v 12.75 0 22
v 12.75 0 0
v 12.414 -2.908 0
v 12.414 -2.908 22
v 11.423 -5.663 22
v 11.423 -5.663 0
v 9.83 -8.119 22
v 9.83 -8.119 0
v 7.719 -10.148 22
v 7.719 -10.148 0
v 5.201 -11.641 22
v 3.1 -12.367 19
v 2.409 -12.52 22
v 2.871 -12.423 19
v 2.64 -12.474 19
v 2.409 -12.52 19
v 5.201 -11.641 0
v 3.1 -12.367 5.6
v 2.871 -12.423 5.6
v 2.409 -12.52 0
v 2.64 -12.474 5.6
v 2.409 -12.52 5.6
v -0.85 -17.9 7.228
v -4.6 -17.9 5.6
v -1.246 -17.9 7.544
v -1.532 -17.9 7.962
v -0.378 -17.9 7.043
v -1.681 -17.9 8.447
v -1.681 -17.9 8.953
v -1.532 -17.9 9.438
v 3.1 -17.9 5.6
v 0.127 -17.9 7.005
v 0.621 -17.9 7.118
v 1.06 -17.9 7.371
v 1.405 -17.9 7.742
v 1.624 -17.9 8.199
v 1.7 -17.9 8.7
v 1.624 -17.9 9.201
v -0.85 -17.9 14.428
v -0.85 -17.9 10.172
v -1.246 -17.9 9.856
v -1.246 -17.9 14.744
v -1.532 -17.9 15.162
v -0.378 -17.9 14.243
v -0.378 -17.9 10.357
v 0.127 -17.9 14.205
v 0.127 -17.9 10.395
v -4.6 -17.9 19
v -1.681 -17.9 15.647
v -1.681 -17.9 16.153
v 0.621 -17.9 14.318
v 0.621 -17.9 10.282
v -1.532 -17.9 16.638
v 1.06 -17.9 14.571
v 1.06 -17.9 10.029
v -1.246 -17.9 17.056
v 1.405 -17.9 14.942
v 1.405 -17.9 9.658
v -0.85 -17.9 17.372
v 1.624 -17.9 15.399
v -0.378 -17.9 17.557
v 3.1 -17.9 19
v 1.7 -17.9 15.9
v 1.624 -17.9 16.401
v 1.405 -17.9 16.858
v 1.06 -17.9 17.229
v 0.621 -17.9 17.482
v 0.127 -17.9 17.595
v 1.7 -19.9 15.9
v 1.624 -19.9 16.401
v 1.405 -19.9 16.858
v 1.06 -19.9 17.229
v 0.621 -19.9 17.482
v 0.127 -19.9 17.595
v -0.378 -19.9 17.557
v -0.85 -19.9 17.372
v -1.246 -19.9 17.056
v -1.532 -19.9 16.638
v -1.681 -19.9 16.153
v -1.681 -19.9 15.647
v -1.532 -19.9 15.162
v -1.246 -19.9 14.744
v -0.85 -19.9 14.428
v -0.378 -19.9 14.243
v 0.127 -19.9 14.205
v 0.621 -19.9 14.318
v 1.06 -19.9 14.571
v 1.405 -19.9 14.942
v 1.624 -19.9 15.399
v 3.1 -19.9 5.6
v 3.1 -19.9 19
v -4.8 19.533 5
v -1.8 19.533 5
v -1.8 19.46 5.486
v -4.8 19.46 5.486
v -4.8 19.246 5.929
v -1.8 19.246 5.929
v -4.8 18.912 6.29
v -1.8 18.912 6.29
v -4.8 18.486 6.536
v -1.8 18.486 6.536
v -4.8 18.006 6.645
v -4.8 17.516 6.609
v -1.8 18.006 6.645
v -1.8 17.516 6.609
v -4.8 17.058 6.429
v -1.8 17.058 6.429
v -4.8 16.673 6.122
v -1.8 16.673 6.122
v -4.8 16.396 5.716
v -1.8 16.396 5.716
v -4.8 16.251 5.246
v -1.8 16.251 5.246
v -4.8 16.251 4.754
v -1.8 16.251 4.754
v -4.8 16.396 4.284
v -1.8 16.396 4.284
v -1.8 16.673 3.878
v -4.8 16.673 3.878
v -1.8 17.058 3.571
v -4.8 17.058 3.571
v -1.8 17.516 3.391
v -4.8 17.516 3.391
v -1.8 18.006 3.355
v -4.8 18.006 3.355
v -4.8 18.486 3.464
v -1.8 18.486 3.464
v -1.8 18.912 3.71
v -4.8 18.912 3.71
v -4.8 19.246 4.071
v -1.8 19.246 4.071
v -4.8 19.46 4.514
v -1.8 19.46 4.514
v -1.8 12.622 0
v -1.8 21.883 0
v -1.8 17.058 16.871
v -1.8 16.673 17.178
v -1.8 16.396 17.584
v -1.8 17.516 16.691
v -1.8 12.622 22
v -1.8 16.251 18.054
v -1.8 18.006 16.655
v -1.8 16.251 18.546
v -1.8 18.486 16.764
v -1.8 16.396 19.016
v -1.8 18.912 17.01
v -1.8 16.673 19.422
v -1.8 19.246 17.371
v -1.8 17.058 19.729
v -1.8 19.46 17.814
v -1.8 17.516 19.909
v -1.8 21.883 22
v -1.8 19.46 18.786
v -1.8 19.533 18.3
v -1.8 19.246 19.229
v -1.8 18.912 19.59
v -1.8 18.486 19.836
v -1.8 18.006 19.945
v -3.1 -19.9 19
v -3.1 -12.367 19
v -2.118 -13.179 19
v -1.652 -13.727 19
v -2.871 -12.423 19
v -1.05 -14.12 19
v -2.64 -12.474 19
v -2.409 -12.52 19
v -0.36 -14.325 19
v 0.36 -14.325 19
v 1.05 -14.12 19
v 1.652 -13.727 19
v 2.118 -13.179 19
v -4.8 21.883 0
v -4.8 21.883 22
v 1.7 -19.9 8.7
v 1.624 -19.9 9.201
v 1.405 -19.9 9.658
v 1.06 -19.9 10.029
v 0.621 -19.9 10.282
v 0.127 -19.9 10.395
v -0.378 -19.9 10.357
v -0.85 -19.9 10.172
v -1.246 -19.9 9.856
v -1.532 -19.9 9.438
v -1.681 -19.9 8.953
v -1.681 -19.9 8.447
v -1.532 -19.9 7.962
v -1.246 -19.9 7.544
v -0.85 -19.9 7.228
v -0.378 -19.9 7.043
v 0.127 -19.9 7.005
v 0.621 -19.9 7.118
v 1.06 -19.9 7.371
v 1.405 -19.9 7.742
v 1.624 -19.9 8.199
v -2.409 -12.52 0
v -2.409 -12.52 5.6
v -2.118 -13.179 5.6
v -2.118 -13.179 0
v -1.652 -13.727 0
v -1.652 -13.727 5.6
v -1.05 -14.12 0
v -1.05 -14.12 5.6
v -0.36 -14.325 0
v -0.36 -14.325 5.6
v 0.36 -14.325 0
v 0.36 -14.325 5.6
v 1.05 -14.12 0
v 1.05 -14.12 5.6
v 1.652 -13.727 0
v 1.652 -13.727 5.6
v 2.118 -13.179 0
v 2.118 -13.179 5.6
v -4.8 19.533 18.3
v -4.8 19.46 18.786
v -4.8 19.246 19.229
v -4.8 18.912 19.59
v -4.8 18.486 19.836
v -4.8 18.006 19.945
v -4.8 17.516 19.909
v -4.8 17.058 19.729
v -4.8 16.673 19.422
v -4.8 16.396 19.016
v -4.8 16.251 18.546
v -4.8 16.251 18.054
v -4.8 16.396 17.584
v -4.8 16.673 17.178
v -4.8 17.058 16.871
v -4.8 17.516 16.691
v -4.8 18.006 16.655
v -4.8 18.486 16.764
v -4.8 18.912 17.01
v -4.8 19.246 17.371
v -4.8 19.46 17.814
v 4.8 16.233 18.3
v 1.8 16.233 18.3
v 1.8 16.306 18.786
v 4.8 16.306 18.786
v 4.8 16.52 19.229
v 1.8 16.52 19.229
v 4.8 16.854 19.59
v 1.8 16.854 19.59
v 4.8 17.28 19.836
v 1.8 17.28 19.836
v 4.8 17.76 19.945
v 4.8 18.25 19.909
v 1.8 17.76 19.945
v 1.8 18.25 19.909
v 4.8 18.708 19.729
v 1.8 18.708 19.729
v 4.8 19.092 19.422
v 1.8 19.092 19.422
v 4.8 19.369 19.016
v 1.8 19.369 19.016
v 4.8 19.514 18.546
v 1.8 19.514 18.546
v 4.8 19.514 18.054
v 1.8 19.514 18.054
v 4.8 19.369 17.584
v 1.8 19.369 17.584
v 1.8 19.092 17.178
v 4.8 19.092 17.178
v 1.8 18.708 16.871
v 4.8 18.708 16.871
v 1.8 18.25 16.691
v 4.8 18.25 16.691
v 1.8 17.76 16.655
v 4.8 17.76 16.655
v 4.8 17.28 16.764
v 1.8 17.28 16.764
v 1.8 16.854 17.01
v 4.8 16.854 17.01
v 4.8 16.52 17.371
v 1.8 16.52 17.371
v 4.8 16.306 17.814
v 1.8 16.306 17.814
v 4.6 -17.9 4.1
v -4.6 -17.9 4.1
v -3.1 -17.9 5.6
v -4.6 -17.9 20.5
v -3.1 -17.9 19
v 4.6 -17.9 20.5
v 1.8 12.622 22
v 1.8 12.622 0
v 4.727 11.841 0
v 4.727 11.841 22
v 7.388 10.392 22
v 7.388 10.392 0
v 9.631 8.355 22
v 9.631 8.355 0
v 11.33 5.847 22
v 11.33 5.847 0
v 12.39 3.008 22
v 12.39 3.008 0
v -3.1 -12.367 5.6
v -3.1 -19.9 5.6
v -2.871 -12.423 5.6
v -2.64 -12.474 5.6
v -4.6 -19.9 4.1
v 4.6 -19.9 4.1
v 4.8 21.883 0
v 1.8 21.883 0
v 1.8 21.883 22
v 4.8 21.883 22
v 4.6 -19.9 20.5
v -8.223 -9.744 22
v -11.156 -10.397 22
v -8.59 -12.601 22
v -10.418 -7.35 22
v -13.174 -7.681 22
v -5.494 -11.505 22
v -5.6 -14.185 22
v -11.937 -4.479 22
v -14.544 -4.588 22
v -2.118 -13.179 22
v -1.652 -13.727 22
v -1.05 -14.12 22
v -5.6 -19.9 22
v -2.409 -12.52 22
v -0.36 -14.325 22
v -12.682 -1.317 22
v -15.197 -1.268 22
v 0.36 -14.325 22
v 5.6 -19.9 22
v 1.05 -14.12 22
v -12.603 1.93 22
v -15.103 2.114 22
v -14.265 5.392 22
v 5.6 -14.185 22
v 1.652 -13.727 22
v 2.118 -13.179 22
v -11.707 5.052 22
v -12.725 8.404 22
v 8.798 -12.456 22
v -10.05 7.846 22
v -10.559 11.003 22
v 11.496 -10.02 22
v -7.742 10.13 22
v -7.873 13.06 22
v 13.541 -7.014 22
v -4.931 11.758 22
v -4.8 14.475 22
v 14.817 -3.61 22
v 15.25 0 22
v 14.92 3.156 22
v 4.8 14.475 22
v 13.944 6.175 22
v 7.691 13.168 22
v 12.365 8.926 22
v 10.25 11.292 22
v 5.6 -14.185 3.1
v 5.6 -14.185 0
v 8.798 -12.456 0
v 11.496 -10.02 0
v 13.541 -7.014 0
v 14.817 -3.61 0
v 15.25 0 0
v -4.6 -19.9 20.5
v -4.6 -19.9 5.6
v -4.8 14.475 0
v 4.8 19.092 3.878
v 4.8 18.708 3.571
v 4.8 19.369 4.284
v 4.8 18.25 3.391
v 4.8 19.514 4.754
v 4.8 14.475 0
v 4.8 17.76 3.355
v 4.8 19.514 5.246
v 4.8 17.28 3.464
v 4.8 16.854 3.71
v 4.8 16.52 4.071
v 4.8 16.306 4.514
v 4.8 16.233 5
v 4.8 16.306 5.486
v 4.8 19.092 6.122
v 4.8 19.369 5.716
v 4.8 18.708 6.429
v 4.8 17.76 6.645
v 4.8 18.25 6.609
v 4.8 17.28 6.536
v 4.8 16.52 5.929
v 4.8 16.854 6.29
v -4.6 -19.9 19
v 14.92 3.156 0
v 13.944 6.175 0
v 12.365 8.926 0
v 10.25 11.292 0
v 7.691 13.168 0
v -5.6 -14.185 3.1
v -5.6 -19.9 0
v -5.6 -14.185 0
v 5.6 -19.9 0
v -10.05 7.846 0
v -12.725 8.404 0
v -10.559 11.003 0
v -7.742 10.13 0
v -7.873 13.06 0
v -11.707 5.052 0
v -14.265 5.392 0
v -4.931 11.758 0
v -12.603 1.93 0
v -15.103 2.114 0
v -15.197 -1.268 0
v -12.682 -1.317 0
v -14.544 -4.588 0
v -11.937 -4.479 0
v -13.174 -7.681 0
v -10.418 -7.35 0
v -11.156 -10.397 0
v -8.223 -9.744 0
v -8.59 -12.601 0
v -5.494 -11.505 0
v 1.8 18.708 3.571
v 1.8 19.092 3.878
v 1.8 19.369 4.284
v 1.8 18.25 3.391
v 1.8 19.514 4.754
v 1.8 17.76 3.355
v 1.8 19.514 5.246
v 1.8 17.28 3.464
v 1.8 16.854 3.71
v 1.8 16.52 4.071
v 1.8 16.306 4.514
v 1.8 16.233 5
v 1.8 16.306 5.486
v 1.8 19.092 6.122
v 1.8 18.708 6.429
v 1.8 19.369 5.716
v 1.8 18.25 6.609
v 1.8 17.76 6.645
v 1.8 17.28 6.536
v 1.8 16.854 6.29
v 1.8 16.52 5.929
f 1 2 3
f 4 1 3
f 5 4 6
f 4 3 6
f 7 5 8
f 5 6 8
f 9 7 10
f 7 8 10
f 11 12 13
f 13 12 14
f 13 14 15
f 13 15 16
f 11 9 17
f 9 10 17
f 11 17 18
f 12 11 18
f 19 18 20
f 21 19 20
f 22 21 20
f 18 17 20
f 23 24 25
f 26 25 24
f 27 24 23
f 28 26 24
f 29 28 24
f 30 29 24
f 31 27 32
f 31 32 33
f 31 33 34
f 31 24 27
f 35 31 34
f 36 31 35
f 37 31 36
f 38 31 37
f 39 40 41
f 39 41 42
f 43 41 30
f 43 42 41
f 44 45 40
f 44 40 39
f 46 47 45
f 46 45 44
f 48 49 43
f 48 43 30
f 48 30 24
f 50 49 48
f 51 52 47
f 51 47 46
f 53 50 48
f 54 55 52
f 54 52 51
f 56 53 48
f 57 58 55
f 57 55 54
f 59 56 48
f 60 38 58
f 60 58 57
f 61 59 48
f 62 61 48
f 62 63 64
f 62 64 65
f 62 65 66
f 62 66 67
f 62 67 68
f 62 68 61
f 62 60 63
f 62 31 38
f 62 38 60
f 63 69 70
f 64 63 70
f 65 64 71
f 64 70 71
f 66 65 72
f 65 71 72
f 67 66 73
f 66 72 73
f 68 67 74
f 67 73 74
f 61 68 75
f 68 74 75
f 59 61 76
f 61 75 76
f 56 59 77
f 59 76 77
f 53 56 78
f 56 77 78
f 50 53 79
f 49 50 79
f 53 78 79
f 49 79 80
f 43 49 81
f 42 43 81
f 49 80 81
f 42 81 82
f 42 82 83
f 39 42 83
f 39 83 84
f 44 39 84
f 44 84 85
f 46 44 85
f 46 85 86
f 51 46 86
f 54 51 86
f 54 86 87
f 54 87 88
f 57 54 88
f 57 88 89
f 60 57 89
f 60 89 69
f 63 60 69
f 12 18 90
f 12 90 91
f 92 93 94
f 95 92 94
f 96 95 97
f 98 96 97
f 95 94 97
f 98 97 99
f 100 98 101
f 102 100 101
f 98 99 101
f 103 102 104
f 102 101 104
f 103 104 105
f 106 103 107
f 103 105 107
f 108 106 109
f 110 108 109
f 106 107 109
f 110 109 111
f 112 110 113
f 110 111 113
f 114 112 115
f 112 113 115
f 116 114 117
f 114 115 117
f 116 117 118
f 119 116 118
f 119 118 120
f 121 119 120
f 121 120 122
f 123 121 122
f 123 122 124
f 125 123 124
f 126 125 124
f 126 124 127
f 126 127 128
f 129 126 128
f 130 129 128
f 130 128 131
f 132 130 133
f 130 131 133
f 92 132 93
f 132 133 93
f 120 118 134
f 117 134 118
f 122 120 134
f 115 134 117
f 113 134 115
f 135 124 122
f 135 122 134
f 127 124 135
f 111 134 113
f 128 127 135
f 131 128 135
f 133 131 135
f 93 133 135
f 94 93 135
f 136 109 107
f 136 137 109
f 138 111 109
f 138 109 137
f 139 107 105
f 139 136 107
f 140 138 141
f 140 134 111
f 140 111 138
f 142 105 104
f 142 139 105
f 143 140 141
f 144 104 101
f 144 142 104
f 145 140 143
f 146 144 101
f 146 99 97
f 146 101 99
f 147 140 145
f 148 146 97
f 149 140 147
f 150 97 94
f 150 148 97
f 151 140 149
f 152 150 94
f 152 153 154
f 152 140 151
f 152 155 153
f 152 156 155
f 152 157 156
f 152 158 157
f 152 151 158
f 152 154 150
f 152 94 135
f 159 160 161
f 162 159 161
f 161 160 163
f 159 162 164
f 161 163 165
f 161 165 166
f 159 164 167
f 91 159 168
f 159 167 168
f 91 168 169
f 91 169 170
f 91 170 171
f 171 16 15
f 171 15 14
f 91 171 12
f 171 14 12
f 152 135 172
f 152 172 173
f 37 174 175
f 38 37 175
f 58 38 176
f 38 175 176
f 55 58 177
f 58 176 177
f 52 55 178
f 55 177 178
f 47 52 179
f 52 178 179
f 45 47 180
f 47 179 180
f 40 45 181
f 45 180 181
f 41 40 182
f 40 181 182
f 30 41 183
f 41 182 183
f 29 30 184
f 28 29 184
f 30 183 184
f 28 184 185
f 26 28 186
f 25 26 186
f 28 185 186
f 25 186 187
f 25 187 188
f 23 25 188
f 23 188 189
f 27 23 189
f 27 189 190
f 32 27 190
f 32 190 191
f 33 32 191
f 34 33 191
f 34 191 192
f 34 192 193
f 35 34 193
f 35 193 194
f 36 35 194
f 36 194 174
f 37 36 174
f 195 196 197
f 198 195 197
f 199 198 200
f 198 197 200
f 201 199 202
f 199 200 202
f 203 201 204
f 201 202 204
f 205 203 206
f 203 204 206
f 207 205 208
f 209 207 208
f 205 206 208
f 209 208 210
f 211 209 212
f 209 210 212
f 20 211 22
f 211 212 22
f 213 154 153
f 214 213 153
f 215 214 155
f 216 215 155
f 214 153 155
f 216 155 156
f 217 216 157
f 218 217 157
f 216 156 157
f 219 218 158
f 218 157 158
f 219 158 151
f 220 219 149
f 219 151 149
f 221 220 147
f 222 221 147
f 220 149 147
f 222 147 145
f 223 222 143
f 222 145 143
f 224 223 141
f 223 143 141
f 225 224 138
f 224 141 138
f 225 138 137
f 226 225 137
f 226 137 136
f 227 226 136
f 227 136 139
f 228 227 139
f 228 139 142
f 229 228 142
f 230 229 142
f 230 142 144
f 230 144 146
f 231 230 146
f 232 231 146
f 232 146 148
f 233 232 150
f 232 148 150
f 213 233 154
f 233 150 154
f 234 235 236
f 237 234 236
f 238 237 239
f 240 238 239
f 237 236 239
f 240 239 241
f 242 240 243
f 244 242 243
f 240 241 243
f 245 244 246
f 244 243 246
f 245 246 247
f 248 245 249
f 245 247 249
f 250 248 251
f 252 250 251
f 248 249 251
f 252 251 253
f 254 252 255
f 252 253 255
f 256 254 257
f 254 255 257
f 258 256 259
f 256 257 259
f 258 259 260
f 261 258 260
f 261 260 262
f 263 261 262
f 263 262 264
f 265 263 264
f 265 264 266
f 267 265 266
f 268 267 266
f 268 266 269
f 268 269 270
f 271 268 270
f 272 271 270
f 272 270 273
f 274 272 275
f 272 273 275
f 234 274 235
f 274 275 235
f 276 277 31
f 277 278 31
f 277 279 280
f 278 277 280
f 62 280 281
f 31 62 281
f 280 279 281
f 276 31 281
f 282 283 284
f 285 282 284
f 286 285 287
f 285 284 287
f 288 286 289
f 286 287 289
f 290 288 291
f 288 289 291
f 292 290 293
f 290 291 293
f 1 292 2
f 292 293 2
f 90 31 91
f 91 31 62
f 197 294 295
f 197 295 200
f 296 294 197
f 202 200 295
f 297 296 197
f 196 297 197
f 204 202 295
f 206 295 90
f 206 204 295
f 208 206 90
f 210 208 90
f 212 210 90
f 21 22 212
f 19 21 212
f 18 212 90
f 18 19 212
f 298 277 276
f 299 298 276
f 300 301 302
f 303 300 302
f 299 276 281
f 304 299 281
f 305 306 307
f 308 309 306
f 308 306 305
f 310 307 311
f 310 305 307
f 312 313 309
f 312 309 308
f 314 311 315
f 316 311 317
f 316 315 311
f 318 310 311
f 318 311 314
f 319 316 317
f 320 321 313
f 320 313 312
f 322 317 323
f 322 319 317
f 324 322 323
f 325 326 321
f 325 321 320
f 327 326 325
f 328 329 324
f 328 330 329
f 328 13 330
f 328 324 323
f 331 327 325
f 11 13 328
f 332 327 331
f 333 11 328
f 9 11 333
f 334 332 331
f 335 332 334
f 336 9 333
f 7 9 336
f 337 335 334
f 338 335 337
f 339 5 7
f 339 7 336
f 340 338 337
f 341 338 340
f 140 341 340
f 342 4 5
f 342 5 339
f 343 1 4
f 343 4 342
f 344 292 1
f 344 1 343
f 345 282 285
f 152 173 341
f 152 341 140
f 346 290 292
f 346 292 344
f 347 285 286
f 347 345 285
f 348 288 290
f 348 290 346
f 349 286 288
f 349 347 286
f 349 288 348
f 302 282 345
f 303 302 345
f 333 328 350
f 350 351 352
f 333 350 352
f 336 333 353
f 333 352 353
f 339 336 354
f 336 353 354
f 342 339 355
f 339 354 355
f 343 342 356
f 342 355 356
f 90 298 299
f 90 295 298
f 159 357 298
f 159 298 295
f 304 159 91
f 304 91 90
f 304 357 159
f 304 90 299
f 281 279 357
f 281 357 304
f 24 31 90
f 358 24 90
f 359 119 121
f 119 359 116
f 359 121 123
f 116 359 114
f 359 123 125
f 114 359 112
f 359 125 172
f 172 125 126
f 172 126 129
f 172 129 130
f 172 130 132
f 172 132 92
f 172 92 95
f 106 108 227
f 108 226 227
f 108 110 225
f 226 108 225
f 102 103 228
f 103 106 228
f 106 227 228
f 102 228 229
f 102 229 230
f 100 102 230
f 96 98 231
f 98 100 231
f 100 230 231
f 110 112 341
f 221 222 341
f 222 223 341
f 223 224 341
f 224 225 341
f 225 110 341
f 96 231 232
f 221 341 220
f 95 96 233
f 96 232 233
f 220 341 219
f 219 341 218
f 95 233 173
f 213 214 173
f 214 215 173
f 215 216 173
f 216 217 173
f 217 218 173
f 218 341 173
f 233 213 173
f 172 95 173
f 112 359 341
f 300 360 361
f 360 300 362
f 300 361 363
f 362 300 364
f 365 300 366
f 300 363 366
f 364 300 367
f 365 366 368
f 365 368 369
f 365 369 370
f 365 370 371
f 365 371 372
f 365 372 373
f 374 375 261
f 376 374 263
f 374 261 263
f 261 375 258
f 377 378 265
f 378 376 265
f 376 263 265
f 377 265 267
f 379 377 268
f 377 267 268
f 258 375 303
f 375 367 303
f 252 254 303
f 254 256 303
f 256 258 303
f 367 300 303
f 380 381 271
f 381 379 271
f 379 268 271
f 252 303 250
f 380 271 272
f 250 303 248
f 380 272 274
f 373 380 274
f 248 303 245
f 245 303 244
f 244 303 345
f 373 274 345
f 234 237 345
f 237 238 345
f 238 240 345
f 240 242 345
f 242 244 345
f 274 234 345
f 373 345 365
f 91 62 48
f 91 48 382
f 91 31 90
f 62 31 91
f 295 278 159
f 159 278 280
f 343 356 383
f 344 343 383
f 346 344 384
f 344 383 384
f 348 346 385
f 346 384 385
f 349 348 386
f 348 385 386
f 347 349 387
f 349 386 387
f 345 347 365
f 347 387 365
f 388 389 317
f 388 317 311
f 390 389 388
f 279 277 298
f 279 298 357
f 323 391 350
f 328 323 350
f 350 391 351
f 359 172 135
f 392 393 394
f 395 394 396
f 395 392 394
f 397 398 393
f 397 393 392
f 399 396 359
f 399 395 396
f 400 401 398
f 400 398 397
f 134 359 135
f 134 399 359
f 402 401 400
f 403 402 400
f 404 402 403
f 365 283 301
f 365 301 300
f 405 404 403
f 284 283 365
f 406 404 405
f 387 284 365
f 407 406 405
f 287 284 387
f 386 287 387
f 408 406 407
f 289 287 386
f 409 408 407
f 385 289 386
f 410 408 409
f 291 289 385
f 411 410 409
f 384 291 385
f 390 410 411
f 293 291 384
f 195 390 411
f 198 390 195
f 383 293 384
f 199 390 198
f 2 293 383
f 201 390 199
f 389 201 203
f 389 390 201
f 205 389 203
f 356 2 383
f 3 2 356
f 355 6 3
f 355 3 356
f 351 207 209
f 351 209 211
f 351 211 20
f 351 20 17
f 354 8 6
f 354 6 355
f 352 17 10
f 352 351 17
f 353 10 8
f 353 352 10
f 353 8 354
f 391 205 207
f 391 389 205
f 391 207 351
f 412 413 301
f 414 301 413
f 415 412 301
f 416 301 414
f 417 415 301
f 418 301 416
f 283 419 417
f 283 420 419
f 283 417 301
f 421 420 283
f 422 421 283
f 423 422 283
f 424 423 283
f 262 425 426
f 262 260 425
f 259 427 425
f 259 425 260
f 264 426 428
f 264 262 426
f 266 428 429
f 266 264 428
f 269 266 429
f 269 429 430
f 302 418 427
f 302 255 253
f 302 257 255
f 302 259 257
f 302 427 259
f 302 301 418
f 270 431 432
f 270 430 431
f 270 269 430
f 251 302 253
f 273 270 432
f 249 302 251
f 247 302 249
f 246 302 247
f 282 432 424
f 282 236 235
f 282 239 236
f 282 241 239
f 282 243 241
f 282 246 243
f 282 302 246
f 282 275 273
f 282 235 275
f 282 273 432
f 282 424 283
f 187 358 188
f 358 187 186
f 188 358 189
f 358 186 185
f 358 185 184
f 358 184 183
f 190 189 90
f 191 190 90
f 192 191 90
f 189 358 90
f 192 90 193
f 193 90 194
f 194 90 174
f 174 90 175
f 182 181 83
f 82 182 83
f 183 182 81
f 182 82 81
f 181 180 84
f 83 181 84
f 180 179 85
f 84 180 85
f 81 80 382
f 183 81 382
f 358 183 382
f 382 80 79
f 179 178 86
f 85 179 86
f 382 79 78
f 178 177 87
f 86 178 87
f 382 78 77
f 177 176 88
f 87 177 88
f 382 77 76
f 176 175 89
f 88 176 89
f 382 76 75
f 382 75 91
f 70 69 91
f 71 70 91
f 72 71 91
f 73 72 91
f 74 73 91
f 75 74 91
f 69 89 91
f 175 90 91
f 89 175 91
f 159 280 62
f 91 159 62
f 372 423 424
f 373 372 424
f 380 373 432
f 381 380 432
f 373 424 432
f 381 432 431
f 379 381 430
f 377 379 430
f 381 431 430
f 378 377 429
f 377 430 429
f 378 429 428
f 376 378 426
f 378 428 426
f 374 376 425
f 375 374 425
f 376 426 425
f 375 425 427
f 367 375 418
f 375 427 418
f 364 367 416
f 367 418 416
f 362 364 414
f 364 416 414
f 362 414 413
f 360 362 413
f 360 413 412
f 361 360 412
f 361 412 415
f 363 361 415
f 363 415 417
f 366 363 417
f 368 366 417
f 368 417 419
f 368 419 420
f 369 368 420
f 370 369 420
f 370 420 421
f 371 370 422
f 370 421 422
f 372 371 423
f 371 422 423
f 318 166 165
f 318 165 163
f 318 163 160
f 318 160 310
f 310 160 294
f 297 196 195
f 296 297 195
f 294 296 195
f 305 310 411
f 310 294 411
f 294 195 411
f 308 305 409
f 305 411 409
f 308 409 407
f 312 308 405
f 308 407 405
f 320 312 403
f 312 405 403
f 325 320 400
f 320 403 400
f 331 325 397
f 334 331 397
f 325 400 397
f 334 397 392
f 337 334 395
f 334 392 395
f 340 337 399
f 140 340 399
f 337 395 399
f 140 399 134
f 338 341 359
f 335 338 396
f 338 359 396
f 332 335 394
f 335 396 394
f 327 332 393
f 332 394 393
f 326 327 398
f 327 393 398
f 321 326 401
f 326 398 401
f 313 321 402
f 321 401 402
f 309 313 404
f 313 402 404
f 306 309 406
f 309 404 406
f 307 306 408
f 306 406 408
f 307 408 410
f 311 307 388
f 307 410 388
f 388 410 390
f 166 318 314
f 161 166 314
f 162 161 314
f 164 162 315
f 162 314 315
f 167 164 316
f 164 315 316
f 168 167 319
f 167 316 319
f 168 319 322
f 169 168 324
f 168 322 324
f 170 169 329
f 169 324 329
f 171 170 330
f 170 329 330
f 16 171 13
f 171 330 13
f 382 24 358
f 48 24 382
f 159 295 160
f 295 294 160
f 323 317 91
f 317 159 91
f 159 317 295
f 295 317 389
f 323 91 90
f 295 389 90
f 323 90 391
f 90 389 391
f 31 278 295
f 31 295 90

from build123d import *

# Parameters (mm, degrees)
F1_DEPTH   = 29
F2_W       = 6.7394518952
F2_H       = 29
F2_R       = 1.65
F2_W_2     = 1.2605481048
F3_DEPTH   = 3
F4_W       = 6.7394518952
F4_H       = 29
F4_R       = 1.65
F4_W_2     = 1.2605481048
F5_DEPTH   = 3
F7_W       = 6.2
F7_H       = 13.4
F9_DEPTH   = 25
F8_W       = 11.2
F8_H       = 18.4
F8_W_2     = 6.2
F8_H_2     = 13.4
F10_DEPTH  = 4.1
F11_DEPTH  = 25
F12_W      = 9.2
F12_H      = 16.4
F12_W_2    = 6.2
F12_H_2    = 13.4
F13_DEPTH  = 2
F14_DEPTH  = 7.7
F15_R      = 1.7
F16_DEPTH  = 25
F17_DEPTH  = 2
F19_DEPTH  = 29
F17_FACE_W = 11.2
F17_FACE_H = 2
F20_DEPTH  = 3.1
F21_DEPTH  = 7.5
F22_DEPTH  = 7


with BuildPart() as f1:
    # F0 (on Top) → F1 (new body)
    with BuildSketch(Plane.XY):
        with BuildLine():
            ThreePointArc((1.8, 12.6223016918), (9.6310046205, 8.355013465), (12.75, 0))
            ThreePointArc((12.75, 0), (-8.355013465, -9.6310046205), (-1.8, 12.6223016918))
            Line((-1.8, 12.6223016918), (-1.8, 15.1433979014))
            ThreePointArc((-1.8, 15.1433979014), (-10.1270059741, -11.4020283283), (15.25, 0))
            ThreePointArc((15.25, 0), (11.4020283283, 10.1270059741), (1.8, 15.1433979014))
            Line((1.8, 15.1433979014), (1.8, 12.6223016918))
        make_face()
    extrude(amount=F1_DEPTH)

    # F2 (on face) → F3 (join)
    with BuildSketch(Plane.YZ.offset(-1.8)):
        with Locations((18.513123849, 14.5)):
            Rectangle(F2_W, F2_H)
        with Locations((17.8828497966, 5)):
            Circle(F2_R, mode=Mode.SUBTRACT)
        with Locations((17.8828497966, 18.3)):
            Circle(F2_R, mode=Mode.SUBTRACT)
        with Locations((14.513123849, 14.5)):
            Rectangle(F2_W_2, F2_H)
    extrude(amount=-F3_DEPTH)

    # F4 (on face) → F5 (join)
    with BuildSketch(Plane(origin=(1.8, 0, 0), x_dir=(0, -1, 0), z_dir=(-1, 0, 0))):
        with Locations((-18.513123849, 14.5)):
            Rectangle(F4_W, F4_H)
        with Locations((-17.8828497966, 5)):
            Circle(F4_R, mode=Mode.SUBTRACT)
        with Locations((-17.8828497966, 18.3)):
            Circle(F4_R, mode=Mode.SUBTRACT)
        with Locations((-14.513123849, 14.5)):
            Rectangle(F4_W_2, F4_H)
    extrude(amount=-F5_DEPTH)

    # F7 (on offset) → F9 (cut)
    with BuildSketch(Plane.XZ.offset(13.8)):
        with Locations((0, 12.3)):
            Rectangle(F7_W, F7_H)
    extrude(amount=F9_DEPTH, mode=Mode.SUBTRACT)

    # F8 (on offset) → F10 (join)
    with BuildSketch(Plane.XZ.offset(13.8)):
        with Locations((0, 12.3)):
            Rectangle(F8_W, F8_H)
        with Locations((0, 12.3)):
            Rectangle(F8_W_2, F8_H_2, mode=Mode.SUBTRACT)
    extrude(amount=F10_DEPTH)

    # F11 (cut): a face of the model
    f11_faces = [f1.faces().sort_by_distance(p)[0] for p in [
        (0, -13.8, 12.3),
    ]]
    extrude(f11_faces, amount=-F11_DEPTH, mode=Mode.SUBTRACT)


with BuildPart() as f13:
    # F12 (on face) → F13 (new body)
    with BuildSketch(Plane.XZ.offset(17.9)):
        with Locations((0, 12.3)):
            Rectangle(F12_W, F12_H)
        with Locations((0, 12.3)):
            Rectangle(F12_W_2, F12_H_2, mode=Mode.SUBTRACT)
    extrude(amount=F13_DEPTH)


with BuildPart() as f14:
    # F14 (new, through all): a face of the model
    f14_faces = [f13.part.faces().sort_by_distance(p)[0] for p in [
        (3.1, -18.9, 12.3),
    ]]
    extrude(f14_faces, amount=F14_DEPTH)

    # F15 (on face) → F16 (cut)
    with BuildSketch(Plane.XZ.offset(19.9)):
        with Locations((0, 15.9)):
            Circle(F15_R)
        with Locations((0, 8.7)):
            Circle(F15_R)
    extrude(amount=-F16_DEPTH, mode=Mode.SUBTRACT)


with BuildPart() as f17:
    # F17 (new, through all): a face of the model
    f17_faces = [f1.part.faces().sort_by_distance(p)[0] for p in [
        (5.3845934077, -17.9, 12.3),
    ]]
    extrude(f17_faces, amount=F17_DEPTH)


with BuildPart() as f1_1:
    add(f1.part)

    # F18 (on face) → F19 (cut, through all)
    with BuildSketch(Plane.XY.offset(29)):
        with BuildLine():
            ThreePointArc((2.4087704015, -12.5203963656), (0, -12.75), (-2.4087704015, -12.5203963656))
            ThreePointArc((-2.4087704015, -12.5203963656), (0, -14.3511989713), (2.4087704015, -12.5203963656))
        make_face()
    extrude(amount=-F19_DEPTH, mode=Mode.SUBTRACT)

    add(f17.part)  # F20 merges F17
    # F17_face (on face) + F10_face1 (on face) → F20 (join, through all)
    with BuildSketch(Plane(origin=(0, -18.9, 3.1), x_dir=(1, 0, 0), z_dir=(0, 0, -1))):
        Rectangle(F17_FACE_W, F17_FACE_H)
    with BuildSketch(Plane(origin=(0, -16.3833509028, 3.1), x_dir=(1, 0, 0), z_dir=(0, 0, -1))):
        with BuildLine():
            ThreePointArc((-5.6, -2.1987641975), (0, -1.1333509028), (5.6, -2.1987641975))
            Line((5.6, -2.1987641975), (5.6, 1.5166490972))
            Line((5.6, 1.5166490972), (-5.6, 1.5166490972))
            Line((-5.6, 1.5166490972), (-5.6, -2.1987641975))
        make_face()
    extrude(amount=F20_DEPTH)

    # F21 (add, through all): a face of the model
    f21_faces = [f1_1.faces().sort_by_distance(p)[0] for p in [
        (0, -17.3900060691, 21.5),
    ]]
    extrude(f21_faces, amount=F21_DEPTH)

    # F22 (cut): a face of the model
    f22_faces = [f1_1.faces().sort_by_distance(p)[0] for p in [
        (0, -19.3826938491, 29),
    ]]
    extrude(f22_faces, amount=-F22_DEPTH, mode=Mode.SUBTRACT)


solid = Compound([f13.part, f14.part, f1_1.part])
